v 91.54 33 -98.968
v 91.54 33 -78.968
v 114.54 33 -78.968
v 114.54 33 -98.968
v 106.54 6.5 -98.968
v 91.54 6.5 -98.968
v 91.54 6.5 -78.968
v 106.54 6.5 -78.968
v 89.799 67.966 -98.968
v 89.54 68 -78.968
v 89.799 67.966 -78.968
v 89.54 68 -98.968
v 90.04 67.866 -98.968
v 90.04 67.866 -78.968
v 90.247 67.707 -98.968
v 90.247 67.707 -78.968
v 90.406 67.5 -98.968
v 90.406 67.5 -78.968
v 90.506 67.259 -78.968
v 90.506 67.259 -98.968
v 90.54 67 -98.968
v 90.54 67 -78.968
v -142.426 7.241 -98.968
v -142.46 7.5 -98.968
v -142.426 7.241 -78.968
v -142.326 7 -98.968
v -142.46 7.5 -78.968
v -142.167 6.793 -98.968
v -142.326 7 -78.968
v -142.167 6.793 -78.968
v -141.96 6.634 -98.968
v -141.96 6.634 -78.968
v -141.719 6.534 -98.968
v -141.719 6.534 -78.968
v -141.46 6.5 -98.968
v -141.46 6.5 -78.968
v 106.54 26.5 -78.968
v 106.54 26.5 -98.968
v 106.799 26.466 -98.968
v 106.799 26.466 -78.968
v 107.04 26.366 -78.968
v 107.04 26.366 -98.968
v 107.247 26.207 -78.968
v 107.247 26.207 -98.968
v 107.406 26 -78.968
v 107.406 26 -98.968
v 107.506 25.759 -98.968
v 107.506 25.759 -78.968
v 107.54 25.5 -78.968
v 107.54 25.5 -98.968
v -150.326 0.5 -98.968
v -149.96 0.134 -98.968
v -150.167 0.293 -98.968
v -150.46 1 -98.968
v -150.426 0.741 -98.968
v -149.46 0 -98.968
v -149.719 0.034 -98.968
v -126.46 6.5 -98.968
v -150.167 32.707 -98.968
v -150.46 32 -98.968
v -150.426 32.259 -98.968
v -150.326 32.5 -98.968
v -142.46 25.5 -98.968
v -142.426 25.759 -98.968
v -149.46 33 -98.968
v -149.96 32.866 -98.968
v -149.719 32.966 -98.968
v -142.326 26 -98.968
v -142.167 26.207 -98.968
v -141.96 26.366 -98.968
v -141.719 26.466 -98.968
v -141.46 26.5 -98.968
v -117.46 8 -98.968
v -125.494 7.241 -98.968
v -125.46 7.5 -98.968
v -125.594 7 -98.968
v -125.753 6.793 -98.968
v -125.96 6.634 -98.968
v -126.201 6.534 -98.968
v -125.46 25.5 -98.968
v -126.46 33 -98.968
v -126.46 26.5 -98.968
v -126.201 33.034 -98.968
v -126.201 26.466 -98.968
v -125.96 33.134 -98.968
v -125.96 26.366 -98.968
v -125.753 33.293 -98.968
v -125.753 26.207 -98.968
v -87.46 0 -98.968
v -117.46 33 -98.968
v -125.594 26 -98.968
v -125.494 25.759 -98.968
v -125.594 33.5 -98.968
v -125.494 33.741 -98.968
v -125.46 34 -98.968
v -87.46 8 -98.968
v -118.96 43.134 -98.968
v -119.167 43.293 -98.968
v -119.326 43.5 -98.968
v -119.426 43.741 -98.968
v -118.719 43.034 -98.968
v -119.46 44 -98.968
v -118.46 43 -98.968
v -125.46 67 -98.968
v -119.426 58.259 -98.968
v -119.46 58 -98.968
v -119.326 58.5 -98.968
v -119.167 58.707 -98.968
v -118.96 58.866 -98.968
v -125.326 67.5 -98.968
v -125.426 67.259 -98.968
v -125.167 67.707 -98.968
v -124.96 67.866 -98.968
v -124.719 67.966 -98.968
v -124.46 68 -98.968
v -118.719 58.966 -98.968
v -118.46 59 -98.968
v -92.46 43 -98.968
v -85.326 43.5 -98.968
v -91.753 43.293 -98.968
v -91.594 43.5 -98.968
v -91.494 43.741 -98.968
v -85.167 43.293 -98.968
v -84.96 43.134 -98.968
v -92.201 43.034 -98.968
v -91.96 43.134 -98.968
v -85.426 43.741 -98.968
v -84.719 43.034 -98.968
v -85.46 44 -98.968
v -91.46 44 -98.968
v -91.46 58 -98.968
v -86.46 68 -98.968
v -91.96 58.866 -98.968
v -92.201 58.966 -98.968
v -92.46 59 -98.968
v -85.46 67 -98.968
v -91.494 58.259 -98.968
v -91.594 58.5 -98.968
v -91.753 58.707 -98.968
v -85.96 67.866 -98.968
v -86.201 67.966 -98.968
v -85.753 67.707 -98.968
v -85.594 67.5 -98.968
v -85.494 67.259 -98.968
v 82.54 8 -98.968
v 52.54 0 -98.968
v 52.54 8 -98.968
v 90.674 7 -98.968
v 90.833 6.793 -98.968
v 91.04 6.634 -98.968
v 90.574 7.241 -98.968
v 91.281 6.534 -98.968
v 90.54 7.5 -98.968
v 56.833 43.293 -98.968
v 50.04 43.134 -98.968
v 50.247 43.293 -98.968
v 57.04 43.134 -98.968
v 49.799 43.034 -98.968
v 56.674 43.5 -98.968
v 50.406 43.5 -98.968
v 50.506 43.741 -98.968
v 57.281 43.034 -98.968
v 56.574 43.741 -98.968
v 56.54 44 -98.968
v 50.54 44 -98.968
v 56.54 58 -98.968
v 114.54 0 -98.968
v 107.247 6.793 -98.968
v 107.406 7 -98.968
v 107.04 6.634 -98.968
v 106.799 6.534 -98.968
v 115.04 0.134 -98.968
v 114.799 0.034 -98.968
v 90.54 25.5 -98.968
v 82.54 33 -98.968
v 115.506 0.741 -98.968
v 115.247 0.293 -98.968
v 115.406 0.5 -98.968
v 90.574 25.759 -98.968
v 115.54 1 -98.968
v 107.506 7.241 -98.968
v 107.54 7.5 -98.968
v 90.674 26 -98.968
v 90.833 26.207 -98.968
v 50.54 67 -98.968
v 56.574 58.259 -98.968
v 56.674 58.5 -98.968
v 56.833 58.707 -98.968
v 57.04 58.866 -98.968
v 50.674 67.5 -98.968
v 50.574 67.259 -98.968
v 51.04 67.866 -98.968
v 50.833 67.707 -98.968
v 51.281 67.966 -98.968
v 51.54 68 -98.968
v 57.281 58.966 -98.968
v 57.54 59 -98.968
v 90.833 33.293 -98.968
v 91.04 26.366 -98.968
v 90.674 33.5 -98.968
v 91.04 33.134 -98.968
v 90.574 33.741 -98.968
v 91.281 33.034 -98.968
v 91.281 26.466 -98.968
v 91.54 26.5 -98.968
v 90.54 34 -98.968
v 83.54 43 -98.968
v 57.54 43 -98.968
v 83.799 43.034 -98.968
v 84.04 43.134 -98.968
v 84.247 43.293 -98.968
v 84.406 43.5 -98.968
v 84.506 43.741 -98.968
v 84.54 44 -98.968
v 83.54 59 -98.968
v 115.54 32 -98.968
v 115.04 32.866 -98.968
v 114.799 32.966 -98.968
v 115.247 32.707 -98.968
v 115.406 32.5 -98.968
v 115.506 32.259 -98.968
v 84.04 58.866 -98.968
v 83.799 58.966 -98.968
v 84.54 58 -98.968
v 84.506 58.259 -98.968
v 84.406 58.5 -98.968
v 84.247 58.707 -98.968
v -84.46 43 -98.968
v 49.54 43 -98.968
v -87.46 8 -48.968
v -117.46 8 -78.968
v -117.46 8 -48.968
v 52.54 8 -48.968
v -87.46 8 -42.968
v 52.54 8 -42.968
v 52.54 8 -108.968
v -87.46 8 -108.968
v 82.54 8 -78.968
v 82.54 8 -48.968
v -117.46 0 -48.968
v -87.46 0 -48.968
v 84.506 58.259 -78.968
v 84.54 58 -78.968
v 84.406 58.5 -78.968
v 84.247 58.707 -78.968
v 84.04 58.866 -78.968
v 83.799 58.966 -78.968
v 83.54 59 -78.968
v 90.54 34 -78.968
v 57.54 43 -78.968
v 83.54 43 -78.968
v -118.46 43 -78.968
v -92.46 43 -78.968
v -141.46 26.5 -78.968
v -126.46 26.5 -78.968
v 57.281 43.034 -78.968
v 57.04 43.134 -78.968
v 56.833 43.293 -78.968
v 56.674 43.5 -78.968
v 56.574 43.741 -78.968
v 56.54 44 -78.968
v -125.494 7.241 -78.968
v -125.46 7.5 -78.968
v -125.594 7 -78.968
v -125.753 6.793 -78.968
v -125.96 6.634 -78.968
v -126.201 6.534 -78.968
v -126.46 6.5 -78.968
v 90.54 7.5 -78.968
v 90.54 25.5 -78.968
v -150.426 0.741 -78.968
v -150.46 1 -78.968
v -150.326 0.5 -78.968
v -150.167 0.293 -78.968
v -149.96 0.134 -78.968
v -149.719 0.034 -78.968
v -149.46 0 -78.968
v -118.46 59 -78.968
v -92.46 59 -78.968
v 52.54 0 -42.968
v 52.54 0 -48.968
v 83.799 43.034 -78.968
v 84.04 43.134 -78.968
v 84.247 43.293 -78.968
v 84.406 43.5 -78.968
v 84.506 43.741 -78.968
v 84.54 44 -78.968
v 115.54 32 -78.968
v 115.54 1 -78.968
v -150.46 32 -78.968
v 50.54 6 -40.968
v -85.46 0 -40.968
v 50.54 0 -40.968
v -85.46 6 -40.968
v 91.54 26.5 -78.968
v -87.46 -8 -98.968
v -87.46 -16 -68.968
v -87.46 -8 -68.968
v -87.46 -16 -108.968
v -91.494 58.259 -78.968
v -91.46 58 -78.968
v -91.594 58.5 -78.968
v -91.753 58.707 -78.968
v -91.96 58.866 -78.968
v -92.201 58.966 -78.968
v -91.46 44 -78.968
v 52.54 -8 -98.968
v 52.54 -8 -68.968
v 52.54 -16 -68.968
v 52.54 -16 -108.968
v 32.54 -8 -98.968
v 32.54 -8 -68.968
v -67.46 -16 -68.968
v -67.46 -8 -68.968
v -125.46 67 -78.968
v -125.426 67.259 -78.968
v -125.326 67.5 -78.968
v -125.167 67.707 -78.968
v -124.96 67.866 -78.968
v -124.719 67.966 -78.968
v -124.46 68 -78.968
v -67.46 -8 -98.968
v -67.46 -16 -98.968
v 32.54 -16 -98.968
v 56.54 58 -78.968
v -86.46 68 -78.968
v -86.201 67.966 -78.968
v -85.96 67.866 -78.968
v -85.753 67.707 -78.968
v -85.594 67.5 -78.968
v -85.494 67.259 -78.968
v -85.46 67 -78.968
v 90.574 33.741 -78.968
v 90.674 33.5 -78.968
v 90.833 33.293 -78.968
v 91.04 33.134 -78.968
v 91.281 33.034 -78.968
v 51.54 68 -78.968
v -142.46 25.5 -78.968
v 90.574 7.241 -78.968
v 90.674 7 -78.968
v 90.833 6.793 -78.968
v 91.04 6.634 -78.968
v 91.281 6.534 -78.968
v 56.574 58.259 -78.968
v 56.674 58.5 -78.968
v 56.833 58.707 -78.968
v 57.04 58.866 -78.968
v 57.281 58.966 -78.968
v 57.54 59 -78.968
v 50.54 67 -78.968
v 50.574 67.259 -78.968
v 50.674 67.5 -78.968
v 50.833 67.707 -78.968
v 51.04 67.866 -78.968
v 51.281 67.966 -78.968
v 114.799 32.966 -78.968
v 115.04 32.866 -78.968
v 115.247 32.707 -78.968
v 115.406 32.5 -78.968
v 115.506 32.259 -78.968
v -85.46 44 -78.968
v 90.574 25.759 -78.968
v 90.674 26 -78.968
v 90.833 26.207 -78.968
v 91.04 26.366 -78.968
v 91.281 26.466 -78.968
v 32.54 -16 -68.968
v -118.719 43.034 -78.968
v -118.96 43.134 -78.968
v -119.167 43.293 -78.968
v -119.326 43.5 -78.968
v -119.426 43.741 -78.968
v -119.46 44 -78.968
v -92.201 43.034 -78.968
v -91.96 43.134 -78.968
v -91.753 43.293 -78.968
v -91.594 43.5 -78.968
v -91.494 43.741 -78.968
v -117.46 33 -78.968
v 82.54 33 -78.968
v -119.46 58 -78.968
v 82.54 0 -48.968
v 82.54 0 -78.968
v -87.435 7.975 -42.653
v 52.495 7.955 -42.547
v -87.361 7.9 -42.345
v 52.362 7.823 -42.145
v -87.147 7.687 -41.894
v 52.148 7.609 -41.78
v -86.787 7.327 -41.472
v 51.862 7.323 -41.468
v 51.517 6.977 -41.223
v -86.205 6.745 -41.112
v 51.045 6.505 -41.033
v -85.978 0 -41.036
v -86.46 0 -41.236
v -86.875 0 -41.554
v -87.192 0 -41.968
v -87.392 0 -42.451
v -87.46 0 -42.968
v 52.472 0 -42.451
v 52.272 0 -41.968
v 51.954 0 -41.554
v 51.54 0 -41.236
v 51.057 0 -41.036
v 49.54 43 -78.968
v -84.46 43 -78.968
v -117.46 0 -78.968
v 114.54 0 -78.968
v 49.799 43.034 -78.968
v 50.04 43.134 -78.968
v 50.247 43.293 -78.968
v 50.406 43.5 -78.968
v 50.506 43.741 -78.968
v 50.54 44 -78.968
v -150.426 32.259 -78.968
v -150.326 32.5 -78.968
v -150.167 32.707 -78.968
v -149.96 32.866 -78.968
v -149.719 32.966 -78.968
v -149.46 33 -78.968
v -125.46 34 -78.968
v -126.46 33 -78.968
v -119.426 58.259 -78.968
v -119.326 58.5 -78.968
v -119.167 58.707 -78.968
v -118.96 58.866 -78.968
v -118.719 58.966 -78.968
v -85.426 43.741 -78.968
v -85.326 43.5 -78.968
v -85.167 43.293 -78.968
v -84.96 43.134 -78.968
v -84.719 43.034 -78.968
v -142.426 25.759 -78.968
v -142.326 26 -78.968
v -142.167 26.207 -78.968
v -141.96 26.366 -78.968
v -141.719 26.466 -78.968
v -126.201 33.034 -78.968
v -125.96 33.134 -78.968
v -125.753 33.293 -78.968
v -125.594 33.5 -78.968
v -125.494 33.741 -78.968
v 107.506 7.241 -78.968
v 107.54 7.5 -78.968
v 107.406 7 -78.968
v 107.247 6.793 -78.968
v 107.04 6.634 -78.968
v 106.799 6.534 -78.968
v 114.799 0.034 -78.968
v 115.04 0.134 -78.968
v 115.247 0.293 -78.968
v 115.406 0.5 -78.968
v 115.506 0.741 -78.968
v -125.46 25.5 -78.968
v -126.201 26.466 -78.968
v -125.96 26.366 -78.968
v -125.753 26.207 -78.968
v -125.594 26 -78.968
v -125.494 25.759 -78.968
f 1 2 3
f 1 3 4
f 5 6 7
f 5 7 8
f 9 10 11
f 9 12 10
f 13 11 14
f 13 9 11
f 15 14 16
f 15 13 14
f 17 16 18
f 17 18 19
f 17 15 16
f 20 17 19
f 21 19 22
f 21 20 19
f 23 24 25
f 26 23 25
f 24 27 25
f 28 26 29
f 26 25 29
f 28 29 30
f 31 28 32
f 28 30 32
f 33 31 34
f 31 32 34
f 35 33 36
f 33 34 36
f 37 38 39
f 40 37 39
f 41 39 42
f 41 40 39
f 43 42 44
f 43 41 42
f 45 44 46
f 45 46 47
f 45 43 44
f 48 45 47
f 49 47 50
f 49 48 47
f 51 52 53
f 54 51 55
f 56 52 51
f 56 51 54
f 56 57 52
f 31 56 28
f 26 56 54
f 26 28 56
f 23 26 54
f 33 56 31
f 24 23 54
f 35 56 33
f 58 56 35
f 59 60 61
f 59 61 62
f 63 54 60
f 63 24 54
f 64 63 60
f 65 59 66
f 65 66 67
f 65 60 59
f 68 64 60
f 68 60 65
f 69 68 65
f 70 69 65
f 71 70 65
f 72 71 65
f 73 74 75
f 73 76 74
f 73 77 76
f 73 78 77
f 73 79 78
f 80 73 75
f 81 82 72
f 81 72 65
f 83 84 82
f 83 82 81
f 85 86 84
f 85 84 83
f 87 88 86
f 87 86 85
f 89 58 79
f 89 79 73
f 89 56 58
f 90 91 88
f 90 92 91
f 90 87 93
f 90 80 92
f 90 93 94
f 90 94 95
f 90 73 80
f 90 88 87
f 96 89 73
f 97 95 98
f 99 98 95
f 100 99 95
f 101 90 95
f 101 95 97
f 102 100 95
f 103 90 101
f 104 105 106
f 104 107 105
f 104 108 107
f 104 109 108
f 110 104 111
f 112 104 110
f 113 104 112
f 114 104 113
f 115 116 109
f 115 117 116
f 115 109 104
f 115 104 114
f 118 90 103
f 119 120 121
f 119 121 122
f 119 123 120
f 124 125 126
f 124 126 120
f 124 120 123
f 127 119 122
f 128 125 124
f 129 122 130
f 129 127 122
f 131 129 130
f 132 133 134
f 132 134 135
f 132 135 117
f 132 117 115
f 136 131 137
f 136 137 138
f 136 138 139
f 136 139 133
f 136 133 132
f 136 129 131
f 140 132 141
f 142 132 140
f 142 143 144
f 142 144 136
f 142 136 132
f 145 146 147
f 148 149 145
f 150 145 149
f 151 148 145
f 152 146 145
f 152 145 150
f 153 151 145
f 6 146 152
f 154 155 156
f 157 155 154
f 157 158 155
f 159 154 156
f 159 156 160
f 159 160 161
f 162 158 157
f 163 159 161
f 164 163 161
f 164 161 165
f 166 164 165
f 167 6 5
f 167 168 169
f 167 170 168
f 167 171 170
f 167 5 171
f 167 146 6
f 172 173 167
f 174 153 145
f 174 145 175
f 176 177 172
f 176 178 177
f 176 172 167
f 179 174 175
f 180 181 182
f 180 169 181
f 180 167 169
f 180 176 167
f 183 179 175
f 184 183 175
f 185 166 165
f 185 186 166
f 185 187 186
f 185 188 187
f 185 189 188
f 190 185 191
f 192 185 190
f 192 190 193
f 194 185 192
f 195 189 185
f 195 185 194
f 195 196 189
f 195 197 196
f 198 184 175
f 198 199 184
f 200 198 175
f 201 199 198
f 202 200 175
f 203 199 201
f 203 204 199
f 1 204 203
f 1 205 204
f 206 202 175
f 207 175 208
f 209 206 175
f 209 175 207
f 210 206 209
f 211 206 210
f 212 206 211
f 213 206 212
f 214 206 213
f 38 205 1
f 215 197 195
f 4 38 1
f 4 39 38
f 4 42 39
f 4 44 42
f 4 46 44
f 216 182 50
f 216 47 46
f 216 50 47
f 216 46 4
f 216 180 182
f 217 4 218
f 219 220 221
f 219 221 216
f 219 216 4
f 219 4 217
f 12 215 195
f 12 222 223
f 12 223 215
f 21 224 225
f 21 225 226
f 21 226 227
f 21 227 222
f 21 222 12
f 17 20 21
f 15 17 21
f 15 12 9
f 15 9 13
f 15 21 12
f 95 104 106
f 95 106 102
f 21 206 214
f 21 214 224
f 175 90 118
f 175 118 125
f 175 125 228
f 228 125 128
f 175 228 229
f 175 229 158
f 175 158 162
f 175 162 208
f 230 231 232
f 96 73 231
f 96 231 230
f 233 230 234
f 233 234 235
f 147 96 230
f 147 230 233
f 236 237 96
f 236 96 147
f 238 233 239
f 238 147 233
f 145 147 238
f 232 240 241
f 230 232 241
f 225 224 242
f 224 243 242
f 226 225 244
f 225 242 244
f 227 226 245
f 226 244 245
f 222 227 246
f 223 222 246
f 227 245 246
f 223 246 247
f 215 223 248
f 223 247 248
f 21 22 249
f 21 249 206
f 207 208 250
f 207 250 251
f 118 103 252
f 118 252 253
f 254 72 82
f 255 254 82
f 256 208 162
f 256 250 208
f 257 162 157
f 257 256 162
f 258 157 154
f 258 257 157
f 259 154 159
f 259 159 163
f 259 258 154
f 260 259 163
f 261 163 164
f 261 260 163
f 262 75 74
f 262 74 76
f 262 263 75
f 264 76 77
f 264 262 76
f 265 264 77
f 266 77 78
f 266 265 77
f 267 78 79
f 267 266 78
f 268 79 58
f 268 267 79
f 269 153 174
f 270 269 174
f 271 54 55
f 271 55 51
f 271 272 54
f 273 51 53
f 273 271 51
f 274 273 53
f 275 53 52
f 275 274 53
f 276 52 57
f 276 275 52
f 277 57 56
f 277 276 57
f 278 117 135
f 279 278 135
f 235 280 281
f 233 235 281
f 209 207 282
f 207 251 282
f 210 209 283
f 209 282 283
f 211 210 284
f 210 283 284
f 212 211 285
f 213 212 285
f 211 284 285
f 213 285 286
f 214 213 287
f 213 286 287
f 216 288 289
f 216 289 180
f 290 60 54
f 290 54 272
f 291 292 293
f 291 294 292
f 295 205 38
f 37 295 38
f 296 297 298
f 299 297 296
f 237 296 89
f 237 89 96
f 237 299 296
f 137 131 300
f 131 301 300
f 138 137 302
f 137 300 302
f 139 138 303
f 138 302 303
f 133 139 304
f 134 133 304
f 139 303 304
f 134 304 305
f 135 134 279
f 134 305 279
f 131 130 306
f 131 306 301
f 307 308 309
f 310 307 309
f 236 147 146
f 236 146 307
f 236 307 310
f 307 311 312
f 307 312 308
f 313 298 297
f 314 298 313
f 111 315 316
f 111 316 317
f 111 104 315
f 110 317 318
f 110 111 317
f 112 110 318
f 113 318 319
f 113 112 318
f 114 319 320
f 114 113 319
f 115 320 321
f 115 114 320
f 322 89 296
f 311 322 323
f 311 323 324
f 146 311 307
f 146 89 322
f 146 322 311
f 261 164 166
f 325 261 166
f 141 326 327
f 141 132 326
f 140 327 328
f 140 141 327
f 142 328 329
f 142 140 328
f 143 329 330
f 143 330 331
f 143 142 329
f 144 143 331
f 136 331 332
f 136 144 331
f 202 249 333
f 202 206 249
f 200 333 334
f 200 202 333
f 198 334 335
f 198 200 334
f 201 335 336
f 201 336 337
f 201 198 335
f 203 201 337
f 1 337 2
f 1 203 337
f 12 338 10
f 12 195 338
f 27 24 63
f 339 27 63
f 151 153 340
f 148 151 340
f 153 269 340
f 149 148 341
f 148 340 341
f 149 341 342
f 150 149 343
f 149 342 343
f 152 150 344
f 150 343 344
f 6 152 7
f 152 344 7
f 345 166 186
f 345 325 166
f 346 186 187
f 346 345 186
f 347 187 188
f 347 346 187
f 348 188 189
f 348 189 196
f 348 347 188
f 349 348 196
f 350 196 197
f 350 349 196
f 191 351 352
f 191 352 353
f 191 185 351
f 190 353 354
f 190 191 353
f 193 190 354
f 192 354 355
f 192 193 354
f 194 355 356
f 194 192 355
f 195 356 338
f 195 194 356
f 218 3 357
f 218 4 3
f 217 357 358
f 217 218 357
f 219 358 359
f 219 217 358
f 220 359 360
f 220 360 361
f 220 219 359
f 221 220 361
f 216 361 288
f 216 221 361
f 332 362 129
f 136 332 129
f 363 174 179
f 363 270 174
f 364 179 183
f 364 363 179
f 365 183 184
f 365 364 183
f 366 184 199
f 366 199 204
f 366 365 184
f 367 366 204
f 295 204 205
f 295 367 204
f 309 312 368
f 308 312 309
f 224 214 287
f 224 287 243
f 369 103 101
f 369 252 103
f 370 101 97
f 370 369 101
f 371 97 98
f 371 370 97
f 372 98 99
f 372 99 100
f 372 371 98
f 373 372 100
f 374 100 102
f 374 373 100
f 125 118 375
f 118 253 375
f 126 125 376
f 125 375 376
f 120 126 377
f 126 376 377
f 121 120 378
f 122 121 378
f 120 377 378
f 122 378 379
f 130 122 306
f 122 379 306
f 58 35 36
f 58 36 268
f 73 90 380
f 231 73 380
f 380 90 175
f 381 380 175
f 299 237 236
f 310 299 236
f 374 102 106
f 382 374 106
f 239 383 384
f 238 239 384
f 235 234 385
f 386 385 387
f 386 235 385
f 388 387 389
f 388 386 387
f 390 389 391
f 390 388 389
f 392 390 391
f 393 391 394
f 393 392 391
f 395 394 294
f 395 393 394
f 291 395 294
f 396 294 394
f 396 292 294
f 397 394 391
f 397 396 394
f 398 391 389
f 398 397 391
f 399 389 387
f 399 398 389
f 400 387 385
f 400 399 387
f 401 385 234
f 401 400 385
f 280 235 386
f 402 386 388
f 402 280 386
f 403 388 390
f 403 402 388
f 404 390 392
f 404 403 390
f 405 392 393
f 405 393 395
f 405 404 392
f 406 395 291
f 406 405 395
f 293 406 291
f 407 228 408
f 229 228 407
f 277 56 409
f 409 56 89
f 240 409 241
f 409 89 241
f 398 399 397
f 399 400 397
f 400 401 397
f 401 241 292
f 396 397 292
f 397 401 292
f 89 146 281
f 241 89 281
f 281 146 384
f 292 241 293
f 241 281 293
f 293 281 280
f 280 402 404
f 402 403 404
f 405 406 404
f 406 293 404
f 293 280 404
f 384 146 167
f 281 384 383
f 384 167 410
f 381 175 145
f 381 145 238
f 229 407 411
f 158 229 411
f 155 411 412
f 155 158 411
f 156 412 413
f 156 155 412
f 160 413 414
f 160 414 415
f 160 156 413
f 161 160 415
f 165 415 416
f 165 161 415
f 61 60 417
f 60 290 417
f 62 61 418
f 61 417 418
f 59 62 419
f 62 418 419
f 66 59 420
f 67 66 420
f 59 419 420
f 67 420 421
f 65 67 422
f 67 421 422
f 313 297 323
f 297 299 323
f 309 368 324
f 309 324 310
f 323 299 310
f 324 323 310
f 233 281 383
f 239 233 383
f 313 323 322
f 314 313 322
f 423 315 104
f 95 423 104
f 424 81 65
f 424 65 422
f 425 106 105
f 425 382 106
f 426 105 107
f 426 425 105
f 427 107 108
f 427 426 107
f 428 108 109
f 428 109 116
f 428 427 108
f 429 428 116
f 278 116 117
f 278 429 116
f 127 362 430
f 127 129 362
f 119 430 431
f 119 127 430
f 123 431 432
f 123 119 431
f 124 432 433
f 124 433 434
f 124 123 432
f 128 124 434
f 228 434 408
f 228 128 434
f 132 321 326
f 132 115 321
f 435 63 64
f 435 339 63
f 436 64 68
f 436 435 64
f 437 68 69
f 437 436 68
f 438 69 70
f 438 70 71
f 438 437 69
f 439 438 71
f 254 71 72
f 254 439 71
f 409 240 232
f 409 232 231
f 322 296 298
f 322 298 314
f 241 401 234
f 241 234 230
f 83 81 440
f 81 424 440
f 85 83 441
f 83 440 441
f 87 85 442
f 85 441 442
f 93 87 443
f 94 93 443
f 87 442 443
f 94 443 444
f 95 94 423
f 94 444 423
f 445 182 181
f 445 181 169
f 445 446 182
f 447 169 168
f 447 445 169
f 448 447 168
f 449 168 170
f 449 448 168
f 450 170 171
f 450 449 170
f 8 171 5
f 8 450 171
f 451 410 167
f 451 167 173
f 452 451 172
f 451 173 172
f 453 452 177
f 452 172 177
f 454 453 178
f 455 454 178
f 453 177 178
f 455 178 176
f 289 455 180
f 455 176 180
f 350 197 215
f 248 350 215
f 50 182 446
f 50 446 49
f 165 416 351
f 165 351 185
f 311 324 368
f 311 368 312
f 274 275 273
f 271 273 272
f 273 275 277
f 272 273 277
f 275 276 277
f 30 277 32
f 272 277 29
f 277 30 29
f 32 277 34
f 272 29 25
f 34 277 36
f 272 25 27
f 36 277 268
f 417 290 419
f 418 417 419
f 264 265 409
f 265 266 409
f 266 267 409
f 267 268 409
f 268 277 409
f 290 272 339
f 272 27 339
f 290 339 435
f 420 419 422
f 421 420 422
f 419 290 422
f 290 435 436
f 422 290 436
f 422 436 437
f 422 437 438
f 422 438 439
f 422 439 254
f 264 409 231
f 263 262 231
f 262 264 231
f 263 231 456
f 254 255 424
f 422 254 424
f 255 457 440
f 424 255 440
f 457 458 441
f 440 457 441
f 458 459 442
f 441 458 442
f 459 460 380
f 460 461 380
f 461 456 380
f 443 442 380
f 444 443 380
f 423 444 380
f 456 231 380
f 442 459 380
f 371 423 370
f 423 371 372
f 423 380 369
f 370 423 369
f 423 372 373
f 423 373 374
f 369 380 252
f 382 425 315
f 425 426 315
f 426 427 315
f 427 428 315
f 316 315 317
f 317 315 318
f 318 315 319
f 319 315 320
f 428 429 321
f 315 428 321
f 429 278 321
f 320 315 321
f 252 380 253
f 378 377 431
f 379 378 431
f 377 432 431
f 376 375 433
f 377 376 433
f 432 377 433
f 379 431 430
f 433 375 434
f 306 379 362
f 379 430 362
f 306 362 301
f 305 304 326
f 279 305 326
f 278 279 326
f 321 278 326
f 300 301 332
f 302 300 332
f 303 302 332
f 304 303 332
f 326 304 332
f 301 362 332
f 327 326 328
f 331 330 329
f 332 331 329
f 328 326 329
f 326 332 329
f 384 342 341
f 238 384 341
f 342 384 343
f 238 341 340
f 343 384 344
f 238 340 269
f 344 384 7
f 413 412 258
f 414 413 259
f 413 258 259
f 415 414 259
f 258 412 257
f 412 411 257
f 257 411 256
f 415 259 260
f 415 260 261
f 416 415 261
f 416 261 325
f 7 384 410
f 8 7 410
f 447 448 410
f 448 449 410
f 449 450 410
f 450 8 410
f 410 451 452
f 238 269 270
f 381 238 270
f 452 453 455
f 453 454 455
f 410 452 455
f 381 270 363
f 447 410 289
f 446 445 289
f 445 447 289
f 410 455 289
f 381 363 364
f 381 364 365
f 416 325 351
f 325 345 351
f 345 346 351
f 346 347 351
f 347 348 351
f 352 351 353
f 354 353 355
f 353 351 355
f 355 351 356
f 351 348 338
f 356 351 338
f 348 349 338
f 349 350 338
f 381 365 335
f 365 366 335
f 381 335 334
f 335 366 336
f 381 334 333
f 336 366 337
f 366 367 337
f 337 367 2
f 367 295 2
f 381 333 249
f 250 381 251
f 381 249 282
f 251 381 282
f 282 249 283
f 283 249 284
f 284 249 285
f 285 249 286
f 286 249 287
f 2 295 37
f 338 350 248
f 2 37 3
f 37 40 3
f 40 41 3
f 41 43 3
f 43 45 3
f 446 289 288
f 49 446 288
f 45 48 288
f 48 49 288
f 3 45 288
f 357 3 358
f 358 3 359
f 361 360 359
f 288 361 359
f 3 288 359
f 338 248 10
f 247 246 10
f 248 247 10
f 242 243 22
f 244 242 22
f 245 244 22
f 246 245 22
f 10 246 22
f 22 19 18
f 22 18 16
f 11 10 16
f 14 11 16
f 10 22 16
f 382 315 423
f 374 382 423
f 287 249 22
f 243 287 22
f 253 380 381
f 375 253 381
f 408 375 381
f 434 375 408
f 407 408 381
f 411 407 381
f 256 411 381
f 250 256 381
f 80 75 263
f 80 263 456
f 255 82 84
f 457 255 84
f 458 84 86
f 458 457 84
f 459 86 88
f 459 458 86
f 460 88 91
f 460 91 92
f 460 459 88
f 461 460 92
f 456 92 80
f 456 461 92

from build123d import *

# Parameters (mm, degrees)
SKETCH_2_W               = 200
SKETCH_2_H               = 50
EXTRUDE_1_DEPTH          = 8
SKETCH_5_W               = 8
SKETCH_5_H               = 20
EXTRUDE_6_DEPTH          = 33
SKETCH_7_W               = 216
SKETCH_7_H               = 20
EXTRUDE_7_DEPTH          = 10
SKETCH_8_W               = 140
SKETCH_8_H               = 8
EXTRUDE_8_DEPTH          = 8
SKETCH_9_W               = 140
SKETCH_9_H               = 10
EXTRUDE_9_DEPTH          = 24
SKETCH_10_W              = 20
SKETCH_10_H              = 8
EXTRUDE_10_DEPTH         = 30
FILLET_1_R               = 2
SKETCH_11_W              = 40
SKETCH_11_H              = 20
EXTRUDE_11_DEPTH         = 25
CUT_EXTRUDE_1_DEPTH      = 148.676305673
CUT_EXTRUDE_1_DEPTH_BACK = 148.676305673
SKETCH_12_W              = 28
SKETCH_12_H              = 16
SKETCH_13_W              = 20
SKETCH_13_H              = 33
EXTRUDE_12_DEPTH         = 25
SKETCH_14_W              = 20
SKETCH_14_H              = 33
EXTRUDE_13_DEPTH         = 25
CUT_EXTRUDE_2_DEPTH      = 170.429357345
CUT_EXTRUDE_2_DEPTH_BACK = 170.429357345
SKETCH_15_W              = 17
SKETCH_15_H              = 20
FILLET_2_R               = 1


with BuildPart() as part:
    # 스케치2 → 보스-돌출1 (new body)
    with BuildSketch(Plane(origin=(0, 0, 0), x_dir=(1, 0, 0), z_dir=(0, 1, 0))):
        with Locations((-17.46031746, 73.968253968)):
            Rectangle(SKETCH_2_W, SKETCH_2_H)
    extrude(amount=EXTRUDE_1_DEPTH)

    # 스케치5 → 보스-돌출6 (add)
    with BuildSketch(Plane.XZ.offset(-33)):
        with Locations((-121.46031746, -88.968253968)):
            Rectangle(SKETCH_5_W, SKETCH_5_H)
        with Locations((86.53968254, -88.968253968)):
            Rectangle(SKETCH_5_W, SKETCH_5_H)
    extrude(amount=EXTRUDE_6_DEPTH)

    # 스케치7 → 보스-돌출7 (add)
    with BuildSketch(Plane(origin=(0, 33, 0), x_dir=(1, 0, 0), z_dir=(0, 1, 0))):
        with Locations((-17.46031746, 88.968253968)):
            Rectangle(SKETCH_7_W, SKETCH_7_H)
    extrude(amount=EXTRUDE_7_DEPTH)

    # 스케치8 → 보스-돌출8 (add)
    with BuildSketch(Plane(origin=(0, 8, 0), x_dir=(1, 0, 0), z_dir=(0, 1, 0))):
        with Locations((-17.46031746, 44.968253968)):
            Rectangle(SKETCH_8_W, SKETCH_8_H)
    extrude(amount=-EXTRUDE_8_DEPTH)

    # 스케치9 → 보스-돌출9 (add)
    with BuildSketch(Plane(origin=(0, 8, 0), x_dir=(1, 0, 0), z_dir=(0, 1, 0))):
        with Locations((-17.46031746, 103.968253968)):
            Rectangle(SKETCH_9_W, SKETCH_9_H)
    extrude(amount=-EXTRUDE_9_DEPTH)

    # 스케치10 → 보스-돌출10 (add)
    with BuildSketch(Plane.XY.offset(-98.968253968)):
        with Locations((-77.46031746, -12)):
            Rectangle(SKETCH_10_W, SKETCH_10_H)
        with Locations((42.53968254, -12)):
            Rectangle(SKETCH_10_W, SKETCH_10_H)
    extrude(amount=EXTRUDE_10_DEPTH)

    # 필렛1
    fillet_1_edges = [part.edges().sort_by_distance(p)[0] for p in [
        (-87.46031746, 4, -40.968253968),
        (52.53968254, 4, -40.968253968),
        (-17.46031746, 8, -40.968253968),
    ]]
    fillet(fillet_1_edges, radius=FILLET_1_R)

    # 스케치11 → 보스-돌출11 (add)
    with BuildSketch(Plane(origin=(0, 43, 0), x_dir=(1, 0, 0), z_dir=(0, 1, 0))):
        with Locations((-105.46031746, 88.968253968)):
            Rectangle(SKETCH_11_W, SKETCH_11_H)
        with Locations((70.53968254, 88.968253968)):
            Rectangle(SKETCH_11_W, SKETCH_11_H)
    extrude(amount=EXTRUDE_11_DEPTH)

    # 스케치12 → 컷-돌출1 (cut, two sides: drawn at the far end of the back side and taken through both)
    with BuildSketch(Plane.XY.offset(-78.968253968).offset(-CUT_EXTRUDE_1_DEPTH_BACK)):
        with Locations((-105.46031746, 51)):
            Rectangle(SKETCH_12_W, SKETCH_12_H)
        with Locations((70.53968254, 51)):
            Rectangle(SKETCH_12_W, SKETCH_12_H)
    extrude(amount=CUT_EXTRUDE_1_DEPTH + CUT_EXTRUDE_1_DEPTH_BACK, mode=Mode.SUBTRACT)

    # 스케치13 → 보스-돌출12 (add)
    with BuildSketch(Plane(origin=(90.53968254, 0, 0), x_dir=(0, 0, -1), z_dir=(1, 0, 0))):
        with Locations((88.968253968, 16.5)):
            Rectangle(SKETCH_13_W, SKETCH_13_H)
    extrude(amount=EXTRUDE_12_DEPTH)

    # 스케치14 → 보스-돌출13 (add)
    with BuildSketch(Plane.ZY.offset(125.46031746)):
        with Locations((-88.968253968, 16.5)):
            Rectangle(SKETCH_14_W, SKETCH_14_H)
    extrude(amount=EXTRUDE_13_DEPTH)

    # 스케치15 → 컷-돌출2 (cut, two sides: drawn at the far end of the back side and taken through both)
    with BuildSketch(Plane.XY.offset(-78.968253968).offset(-CUT_EXTRUDE_2_DEPTH_BACK)):
        with Locations((-133.96031746, 16.5)):
            Rectangle(SKETCH_15_W, SKETCH_15_H)
        with Locations((99.03968254, 16.5)):
            Rectangle(SKETCH_15_W, SKETCH_15_H)
    extrude(amount=CUT_EXTRUDE_2_DEPTH + CUT_EXTRUDE_2_DEPTH_BACK, mode=Mode.SUBTRACT)

    # 필렛2
    fillet_2_edges = [part.edges().sort_by_distance(p)[0] for p in [
        (-85.46031746, 43, -88.968253968),
        (-125.46031746, 68, -88.968253968),
        (-85.46031746, 68, -88.968253968),
        (50.53968254, 43, -88.968253968),
        (50.53968254, 68, -88.968253968),
        (90.53968254, 68, -88.968253968),
        (-91.46031746, 59, -88.968253968),
        (-91.46031746, 43, -88.968253968),
        (-119.46031746, 43, -88.968253968),
        (-119.46031746, 59, -88.968253968),
        (84.53968254, 59, -88.968253968),
        (84.53968254, 43, -88.968253968),
        (56.53968254, 43, -88.968253968),
        (56.53968254, 59, -88.968253968),
        (90.53968254, 33, -88.968253968),
        (115.53968254, 0, -88.968253968),
        (115.53968254, 33, -88.968253968),
        (-125.46031746, 33, -88.968253968),
        (-150.46031746, 0, -88.968253968),
        (-150.46031746, 33, -88.968253968),
        (-142.46031746, 6.5, -88.968253968),
        (-142.46031746, 26.5, -88.968253968),
        (-125.46031746, 26.5, -88.968253968),
        (-125.46031746, 6.5, -88.968253968),
        (90.53968254, 6.5, -88.968253968),
        (90.53968254, 26.5, -88.968253968),
        (107.53968254, 26.5, -88.968253968),
        (107.53968254, 6.5, -88.968253968),
    ]]
    fillet(fillet_2_edges, radius=FILLET_2_R)


solid = part.part
